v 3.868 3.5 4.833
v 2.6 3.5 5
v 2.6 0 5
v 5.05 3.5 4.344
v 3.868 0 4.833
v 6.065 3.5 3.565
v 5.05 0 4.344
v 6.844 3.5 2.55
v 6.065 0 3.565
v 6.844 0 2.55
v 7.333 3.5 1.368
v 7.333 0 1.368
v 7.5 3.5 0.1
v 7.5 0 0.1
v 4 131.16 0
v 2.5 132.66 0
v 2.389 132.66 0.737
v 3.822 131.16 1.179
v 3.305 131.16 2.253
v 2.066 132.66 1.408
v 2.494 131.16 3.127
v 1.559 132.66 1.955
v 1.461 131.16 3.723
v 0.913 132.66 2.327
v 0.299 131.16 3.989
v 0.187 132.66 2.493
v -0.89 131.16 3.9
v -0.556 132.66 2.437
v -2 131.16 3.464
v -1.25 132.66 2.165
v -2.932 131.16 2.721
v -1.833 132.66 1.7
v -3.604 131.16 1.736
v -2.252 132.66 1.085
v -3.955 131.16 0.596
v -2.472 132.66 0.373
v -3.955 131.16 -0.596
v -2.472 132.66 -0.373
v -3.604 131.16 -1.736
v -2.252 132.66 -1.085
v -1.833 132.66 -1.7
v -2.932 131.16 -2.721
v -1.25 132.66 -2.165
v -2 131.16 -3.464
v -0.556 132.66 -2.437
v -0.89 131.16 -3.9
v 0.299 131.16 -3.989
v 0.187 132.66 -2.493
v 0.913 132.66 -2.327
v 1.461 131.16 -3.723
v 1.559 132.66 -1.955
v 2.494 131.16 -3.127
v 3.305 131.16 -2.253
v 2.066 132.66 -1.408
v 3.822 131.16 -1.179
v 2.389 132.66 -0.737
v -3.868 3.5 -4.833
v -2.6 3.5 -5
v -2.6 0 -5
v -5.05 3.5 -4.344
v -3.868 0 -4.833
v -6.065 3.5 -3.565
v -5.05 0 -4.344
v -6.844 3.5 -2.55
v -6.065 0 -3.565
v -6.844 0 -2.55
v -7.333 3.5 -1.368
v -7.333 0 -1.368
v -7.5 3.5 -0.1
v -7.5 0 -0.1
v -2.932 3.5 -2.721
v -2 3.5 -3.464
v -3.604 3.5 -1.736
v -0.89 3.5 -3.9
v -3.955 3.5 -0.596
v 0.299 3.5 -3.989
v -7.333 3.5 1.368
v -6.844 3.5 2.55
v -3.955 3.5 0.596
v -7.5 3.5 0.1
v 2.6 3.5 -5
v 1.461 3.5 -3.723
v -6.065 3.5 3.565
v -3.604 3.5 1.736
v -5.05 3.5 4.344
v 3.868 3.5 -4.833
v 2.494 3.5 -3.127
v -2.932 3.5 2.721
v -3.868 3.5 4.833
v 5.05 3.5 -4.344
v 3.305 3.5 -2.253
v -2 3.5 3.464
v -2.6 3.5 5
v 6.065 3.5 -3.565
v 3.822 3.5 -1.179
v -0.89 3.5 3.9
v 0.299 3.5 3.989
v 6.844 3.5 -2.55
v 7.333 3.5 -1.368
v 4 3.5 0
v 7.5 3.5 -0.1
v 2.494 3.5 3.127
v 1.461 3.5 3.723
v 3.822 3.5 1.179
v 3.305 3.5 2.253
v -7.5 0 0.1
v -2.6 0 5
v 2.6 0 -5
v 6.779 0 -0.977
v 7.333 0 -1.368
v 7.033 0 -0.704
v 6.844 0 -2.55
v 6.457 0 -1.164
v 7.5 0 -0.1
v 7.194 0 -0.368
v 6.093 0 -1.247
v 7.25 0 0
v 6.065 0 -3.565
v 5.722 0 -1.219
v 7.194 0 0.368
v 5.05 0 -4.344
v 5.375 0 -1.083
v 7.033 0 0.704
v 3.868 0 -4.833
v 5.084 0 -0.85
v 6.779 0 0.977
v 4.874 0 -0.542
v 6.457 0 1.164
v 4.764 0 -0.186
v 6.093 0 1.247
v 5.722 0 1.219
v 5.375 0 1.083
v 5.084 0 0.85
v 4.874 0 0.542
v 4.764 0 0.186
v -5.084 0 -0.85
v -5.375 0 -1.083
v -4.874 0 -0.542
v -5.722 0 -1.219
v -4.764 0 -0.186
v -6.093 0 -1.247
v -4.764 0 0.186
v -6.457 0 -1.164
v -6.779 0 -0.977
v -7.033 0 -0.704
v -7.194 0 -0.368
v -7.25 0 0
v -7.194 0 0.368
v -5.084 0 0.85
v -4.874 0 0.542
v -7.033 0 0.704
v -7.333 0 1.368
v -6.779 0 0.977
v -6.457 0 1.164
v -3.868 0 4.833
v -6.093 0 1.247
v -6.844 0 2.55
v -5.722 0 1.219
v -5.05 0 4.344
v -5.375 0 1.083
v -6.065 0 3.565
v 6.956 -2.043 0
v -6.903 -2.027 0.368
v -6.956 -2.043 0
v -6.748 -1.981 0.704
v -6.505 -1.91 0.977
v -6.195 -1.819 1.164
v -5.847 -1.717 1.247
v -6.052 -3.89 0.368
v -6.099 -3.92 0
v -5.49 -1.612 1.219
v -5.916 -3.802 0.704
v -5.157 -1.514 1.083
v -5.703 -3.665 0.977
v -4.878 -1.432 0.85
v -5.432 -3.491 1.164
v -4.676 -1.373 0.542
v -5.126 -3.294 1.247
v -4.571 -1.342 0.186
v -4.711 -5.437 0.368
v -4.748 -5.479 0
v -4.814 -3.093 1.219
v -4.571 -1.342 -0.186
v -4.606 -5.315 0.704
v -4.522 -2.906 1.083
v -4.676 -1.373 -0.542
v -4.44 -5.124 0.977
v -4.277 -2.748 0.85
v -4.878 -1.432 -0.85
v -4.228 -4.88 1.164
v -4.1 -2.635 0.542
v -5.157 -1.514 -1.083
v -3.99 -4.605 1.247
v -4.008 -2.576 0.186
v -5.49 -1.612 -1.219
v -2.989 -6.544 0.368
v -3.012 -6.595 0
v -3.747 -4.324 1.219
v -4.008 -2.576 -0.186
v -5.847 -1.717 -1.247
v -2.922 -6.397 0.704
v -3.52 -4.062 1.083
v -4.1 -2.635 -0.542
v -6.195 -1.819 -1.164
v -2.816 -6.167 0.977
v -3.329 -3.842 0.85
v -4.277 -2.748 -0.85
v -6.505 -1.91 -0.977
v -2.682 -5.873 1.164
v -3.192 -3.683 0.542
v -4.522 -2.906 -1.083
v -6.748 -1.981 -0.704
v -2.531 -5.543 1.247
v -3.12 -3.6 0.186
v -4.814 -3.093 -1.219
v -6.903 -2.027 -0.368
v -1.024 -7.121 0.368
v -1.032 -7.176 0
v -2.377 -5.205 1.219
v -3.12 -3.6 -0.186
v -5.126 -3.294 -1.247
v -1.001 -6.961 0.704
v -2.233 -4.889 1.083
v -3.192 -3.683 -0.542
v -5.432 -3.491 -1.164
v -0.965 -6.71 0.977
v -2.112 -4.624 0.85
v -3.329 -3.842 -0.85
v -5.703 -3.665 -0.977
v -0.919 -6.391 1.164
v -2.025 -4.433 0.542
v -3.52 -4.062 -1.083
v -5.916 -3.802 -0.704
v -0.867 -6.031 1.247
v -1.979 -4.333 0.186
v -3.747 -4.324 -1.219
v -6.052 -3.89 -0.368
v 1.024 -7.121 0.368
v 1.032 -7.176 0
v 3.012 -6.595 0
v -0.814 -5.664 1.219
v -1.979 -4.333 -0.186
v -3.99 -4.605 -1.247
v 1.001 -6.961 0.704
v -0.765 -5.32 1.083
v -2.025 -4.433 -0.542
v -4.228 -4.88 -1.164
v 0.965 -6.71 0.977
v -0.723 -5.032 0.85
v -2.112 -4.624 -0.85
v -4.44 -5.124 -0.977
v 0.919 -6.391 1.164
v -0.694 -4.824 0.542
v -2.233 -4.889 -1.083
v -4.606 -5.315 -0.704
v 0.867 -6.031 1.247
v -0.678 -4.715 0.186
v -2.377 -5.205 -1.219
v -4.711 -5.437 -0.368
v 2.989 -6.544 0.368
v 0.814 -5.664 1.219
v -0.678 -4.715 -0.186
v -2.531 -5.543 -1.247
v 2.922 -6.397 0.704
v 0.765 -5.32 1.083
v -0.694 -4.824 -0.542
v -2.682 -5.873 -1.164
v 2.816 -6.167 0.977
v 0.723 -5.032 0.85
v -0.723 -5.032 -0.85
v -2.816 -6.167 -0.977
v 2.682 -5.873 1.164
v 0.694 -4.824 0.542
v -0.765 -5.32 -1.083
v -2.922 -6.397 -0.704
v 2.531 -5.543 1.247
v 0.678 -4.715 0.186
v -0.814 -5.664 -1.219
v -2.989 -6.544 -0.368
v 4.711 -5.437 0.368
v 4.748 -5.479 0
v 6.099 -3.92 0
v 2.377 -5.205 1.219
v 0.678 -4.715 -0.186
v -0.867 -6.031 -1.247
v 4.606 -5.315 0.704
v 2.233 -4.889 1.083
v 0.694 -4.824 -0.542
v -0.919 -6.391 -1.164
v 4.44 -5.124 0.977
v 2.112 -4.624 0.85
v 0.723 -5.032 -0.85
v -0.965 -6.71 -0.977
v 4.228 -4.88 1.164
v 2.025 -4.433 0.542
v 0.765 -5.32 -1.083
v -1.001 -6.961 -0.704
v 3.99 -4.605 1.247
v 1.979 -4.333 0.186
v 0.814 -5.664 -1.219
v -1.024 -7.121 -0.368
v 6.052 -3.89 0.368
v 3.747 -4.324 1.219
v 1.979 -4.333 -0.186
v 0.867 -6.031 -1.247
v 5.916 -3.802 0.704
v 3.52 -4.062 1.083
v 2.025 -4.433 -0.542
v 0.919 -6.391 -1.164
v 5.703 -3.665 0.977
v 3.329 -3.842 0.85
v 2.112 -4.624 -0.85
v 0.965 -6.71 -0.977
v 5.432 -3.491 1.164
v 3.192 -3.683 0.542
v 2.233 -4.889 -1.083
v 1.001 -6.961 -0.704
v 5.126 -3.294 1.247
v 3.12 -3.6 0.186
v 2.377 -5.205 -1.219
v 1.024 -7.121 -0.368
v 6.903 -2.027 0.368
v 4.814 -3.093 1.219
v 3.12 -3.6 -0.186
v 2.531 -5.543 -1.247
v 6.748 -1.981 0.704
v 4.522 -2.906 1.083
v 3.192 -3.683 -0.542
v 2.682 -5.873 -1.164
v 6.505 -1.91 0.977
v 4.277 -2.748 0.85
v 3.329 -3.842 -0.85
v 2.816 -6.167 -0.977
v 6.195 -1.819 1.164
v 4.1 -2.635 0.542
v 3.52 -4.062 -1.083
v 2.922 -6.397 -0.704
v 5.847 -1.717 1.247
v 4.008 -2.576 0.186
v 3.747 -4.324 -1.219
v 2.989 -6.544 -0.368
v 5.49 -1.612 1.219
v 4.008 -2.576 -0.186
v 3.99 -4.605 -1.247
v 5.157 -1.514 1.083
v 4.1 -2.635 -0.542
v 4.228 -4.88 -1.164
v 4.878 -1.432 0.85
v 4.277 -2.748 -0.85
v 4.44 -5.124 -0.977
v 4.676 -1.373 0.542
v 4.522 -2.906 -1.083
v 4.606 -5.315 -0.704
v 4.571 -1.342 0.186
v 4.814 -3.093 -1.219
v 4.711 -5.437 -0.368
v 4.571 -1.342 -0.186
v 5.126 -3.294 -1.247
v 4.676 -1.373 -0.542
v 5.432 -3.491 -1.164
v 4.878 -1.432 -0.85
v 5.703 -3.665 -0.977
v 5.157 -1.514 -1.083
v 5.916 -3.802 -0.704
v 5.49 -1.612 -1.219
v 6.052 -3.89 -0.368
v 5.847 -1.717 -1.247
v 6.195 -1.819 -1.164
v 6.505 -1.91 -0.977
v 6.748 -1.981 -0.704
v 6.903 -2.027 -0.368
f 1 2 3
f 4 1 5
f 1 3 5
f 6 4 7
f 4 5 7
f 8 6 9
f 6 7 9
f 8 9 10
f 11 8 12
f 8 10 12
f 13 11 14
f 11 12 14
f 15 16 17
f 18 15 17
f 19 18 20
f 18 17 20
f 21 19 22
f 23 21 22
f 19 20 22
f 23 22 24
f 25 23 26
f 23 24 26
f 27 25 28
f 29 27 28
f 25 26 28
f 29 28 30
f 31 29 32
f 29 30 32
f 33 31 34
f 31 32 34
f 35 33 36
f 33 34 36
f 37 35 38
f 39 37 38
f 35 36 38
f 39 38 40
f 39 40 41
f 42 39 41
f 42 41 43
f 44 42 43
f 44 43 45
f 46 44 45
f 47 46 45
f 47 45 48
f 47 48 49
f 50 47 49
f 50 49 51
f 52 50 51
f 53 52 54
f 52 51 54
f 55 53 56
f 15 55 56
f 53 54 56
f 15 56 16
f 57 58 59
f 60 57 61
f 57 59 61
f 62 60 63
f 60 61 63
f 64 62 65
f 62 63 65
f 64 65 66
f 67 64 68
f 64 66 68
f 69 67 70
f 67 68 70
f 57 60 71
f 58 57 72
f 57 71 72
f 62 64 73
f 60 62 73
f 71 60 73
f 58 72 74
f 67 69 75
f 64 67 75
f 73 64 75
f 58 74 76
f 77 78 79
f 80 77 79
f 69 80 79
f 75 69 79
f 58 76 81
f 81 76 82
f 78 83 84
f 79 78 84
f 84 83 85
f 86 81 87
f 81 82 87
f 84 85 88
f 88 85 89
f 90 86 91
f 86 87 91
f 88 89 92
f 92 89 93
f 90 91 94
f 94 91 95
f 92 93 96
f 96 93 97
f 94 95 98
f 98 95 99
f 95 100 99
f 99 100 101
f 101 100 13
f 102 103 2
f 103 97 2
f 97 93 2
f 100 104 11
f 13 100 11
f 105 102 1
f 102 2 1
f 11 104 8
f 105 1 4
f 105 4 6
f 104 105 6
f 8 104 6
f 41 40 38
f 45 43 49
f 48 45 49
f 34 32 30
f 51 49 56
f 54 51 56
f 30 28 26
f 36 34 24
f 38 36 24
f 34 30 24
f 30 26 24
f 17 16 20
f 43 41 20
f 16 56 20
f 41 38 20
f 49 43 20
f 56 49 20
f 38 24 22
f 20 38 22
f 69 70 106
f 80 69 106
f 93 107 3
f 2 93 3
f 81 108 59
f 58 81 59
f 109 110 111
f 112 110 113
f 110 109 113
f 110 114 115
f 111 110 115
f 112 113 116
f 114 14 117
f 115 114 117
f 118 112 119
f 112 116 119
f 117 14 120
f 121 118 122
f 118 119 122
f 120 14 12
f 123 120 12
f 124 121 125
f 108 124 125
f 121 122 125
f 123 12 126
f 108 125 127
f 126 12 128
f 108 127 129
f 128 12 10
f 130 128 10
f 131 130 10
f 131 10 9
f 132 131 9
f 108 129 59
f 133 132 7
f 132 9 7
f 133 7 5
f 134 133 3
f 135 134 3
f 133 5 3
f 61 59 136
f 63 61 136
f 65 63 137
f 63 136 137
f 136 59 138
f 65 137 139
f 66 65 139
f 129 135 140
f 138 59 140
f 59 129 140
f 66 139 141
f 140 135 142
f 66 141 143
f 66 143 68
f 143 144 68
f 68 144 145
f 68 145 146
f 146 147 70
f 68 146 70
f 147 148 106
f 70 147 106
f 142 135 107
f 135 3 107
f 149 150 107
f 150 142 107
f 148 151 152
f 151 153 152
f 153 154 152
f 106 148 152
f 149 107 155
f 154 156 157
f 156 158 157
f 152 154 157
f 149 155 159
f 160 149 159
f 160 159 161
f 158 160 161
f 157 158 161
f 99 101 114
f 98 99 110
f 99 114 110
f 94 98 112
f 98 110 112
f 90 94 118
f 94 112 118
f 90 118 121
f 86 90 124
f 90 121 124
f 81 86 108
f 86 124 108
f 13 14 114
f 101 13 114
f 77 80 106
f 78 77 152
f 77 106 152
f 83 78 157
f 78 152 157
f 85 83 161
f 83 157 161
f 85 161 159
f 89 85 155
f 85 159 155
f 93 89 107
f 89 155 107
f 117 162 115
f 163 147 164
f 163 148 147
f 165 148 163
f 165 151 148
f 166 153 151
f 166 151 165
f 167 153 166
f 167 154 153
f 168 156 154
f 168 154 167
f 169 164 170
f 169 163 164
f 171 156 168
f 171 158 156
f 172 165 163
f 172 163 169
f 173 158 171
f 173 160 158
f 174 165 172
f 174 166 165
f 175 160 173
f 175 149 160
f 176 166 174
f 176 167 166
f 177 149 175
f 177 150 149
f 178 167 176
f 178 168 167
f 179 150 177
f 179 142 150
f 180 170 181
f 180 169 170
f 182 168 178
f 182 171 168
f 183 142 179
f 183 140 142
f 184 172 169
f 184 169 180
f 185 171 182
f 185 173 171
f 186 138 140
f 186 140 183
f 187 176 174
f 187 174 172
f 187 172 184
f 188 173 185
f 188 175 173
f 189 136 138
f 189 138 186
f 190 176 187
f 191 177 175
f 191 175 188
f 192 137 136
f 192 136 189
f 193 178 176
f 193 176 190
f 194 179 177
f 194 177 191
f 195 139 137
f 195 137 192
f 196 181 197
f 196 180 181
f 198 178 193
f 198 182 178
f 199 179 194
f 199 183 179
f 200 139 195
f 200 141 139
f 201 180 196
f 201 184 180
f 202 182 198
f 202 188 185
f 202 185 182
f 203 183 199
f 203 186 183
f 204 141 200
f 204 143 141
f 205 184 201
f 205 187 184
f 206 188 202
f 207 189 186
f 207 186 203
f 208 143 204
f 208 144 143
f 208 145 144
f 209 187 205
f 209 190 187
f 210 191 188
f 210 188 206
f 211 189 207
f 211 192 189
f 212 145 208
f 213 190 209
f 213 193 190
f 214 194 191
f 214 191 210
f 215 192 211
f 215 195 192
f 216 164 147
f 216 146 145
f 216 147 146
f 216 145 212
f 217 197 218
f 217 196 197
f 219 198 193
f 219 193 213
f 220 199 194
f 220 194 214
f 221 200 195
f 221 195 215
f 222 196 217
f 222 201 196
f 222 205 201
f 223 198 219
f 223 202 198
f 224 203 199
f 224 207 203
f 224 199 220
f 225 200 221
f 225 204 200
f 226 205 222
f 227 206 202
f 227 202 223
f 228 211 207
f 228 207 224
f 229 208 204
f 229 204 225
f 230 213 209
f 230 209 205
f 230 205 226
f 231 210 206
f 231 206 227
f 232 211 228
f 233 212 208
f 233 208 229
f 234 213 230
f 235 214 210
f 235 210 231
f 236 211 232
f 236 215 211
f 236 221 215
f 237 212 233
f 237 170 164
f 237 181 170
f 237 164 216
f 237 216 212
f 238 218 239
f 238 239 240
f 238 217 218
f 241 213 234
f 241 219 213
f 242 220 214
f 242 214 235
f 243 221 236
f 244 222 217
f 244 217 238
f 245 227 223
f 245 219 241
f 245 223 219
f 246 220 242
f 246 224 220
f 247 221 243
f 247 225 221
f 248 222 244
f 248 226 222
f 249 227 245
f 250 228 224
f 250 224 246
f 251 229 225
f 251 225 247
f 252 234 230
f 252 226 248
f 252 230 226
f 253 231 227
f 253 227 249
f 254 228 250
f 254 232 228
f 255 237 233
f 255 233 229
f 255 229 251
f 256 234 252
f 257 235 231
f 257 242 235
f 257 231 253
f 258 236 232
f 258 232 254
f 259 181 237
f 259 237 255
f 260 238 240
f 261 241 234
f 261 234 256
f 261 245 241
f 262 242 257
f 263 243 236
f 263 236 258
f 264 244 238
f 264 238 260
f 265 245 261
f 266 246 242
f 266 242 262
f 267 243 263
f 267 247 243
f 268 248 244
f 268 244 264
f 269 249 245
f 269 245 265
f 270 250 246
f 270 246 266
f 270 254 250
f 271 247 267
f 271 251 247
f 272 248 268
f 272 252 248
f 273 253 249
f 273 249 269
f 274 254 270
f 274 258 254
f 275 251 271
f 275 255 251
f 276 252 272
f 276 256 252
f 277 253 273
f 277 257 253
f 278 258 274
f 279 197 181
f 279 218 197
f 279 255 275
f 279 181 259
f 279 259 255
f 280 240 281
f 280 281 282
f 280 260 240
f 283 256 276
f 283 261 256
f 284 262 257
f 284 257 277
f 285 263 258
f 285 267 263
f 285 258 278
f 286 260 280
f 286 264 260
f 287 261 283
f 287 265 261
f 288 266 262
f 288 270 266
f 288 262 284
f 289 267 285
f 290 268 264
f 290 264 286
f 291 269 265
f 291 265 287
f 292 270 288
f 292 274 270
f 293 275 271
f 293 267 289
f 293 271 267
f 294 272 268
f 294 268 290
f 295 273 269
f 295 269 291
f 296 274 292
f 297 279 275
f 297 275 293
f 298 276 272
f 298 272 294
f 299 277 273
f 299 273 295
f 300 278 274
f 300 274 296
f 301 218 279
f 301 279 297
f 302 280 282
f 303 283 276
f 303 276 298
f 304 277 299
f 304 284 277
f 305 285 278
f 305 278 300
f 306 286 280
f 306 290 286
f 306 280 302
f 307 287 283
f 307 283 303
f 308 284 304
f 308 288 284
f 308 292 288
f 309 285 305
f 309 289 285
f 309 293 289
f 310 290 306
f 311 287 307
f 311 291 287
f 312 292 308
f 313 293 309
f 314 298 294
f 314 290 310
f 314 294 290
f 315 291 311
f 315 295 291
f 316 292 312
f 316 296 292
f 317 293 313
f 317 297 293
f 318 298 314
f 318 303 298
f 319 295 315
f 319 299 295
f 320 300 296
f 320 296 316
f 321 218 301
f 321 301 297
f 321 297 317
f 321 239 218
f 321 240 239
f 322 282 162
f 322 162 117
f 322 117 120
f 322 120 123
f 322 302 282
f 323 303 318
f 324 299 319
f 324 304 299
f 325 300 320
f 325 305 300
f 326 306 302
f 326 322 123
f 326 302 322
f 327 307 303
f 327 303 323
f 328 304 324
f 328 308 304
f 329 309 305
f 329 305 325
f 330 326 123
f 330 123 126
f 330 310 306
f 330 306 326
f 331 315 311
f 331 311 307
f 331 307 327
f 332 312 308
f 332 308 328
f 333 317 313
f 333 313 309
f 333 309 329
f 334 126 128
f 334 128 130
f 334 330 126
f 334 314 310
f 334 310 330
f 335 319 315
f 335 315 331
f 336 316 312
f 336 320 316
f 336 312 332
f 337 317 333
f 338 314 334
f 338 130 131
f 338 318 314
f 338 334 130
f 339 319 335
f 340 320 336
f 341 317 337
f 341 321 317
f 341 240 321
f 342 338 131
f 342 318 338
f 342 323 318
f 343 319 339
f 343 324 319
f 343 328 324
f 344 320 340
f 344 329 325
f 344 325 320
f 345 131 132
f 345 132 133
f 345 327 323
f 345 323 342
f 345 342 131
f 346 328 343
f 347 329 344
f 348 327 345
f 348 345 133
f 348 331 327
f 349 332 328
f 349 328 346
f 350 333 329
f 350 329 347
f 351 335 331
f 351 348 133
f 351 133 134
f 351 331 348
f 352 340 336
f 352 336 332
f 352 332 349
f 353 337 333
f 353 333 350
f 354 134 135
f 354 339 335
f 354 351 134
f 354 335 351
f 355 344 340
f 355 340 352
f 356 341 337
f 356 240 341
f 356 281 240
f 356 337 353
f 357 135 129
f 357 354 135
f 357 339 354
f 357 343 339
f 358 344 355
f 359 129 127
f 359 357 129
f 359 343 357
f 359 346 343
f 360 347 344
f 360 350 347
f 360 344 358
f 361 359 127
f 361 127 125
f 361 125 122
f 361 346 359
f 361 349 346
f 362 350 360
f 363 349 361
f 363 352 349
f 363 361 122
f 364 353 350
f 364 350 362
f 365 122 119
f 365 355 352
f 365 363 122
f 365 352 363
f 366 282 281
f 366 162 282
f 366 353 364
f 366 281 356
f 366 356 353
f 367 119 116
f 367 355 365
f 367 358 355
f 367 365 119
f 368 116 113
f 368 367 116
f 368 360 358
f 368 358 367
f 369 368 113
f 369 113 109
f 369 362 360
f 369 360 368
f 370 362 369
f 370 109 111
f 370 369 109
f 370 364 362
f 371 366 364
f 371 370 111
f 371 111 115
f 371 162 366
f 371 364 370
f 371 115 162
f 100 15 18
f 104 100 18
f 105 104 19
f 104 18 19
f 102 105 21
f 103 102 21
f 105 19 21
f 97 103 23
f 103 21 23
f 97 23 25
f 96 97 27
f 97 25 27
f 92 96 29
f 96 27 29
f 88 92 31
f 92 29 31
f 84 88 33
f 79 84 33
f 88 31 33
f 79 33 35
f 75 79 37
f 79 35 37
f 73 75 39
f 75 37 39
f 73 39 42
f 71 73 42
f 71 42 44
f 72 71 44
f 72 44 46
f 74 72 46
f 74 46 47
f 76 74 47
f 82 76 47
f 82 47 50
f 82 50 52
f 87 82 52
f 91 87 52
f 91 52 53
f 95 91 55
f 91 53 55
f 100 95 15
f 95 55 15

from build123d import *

# Parameters (mm, degrees)
ESBO_O2_R             = 11
CORTE_EXTRUS_O1_DEPTH = 10
ESBO_O7_R             = 1.25
CHANFRO1_SIZE         = 1.5


with BuildPart() as part:
    # Esboço1 → Revolução1 (revolve)
    with BuildSketch(Plane.XY):
        Polygon((0, 0), (11, 0), (11, 3.5), (4, 3.5), (4, 132.66), (0, 132.66), align=None)
    revolve(axis=Axis((0, 132.66, 0), (0, -1, 0)))

    # Esboço2 → Corte-extrusão1 (cut)
    with BuildSketch(Plane.XZ):
        Circle(ESBO_O2_R)
        with BuildLine():
            ThreePointArc((7.5, -0.1), (6.064823228, -3.564823228), (2.6, -5))
            Line((2.6, -5), (-2.6, -5))
            ThreePointArc((-2.6, -5), (-6.064823228, -3.564823228), (-7.5, -0.1))
            Line((-7.5, -0.1), (-7.5, 0.1))
            ThreePointArc((-7.5, 0.1), (-6.064823228, 3.564823228), (-2.6, 5))
            Line((-2.6, 5), (2.6, 5))
            ThreePointArc((2.6, 5), (6.064823228, 3.564823228), (7.5, 0.1))
            Line((7.5, 0.1), (7.5, -0.1))
        make_face(mode=Mode.SUBTRACT)
    extrude(amount=-CORTE_EXTRUS_O1_DEPTH, mode=Mode.SUBTRACT)

    # Varredura1: sweep along a path in Esboço9
    with BuildLine(Plane.XY) as varredura1_path:
        ThreePointArc((-6, 0), (0, -6), (6, 0))
    # Esboço7 → Varredura1 (sweep)
    with BuildSketch(Plane(origin=(0, 0, 0), x_dir=(-1, 0, 0), z_dir=(0, -1, 0))):
        with Locations((6, 0)):
            Circle(ESBO_O7_R)
    sweep(path=varredura1_path.line)

    # Chanfro1
    chanfro1_edges = [part.edges().sort_by_distance(p)[0] for p in [
        (-4, 132.66, 0),
    ]]
    chamfer(chanfro1_edges, length=CHANFRO1_SIZE)


solid = part.part
